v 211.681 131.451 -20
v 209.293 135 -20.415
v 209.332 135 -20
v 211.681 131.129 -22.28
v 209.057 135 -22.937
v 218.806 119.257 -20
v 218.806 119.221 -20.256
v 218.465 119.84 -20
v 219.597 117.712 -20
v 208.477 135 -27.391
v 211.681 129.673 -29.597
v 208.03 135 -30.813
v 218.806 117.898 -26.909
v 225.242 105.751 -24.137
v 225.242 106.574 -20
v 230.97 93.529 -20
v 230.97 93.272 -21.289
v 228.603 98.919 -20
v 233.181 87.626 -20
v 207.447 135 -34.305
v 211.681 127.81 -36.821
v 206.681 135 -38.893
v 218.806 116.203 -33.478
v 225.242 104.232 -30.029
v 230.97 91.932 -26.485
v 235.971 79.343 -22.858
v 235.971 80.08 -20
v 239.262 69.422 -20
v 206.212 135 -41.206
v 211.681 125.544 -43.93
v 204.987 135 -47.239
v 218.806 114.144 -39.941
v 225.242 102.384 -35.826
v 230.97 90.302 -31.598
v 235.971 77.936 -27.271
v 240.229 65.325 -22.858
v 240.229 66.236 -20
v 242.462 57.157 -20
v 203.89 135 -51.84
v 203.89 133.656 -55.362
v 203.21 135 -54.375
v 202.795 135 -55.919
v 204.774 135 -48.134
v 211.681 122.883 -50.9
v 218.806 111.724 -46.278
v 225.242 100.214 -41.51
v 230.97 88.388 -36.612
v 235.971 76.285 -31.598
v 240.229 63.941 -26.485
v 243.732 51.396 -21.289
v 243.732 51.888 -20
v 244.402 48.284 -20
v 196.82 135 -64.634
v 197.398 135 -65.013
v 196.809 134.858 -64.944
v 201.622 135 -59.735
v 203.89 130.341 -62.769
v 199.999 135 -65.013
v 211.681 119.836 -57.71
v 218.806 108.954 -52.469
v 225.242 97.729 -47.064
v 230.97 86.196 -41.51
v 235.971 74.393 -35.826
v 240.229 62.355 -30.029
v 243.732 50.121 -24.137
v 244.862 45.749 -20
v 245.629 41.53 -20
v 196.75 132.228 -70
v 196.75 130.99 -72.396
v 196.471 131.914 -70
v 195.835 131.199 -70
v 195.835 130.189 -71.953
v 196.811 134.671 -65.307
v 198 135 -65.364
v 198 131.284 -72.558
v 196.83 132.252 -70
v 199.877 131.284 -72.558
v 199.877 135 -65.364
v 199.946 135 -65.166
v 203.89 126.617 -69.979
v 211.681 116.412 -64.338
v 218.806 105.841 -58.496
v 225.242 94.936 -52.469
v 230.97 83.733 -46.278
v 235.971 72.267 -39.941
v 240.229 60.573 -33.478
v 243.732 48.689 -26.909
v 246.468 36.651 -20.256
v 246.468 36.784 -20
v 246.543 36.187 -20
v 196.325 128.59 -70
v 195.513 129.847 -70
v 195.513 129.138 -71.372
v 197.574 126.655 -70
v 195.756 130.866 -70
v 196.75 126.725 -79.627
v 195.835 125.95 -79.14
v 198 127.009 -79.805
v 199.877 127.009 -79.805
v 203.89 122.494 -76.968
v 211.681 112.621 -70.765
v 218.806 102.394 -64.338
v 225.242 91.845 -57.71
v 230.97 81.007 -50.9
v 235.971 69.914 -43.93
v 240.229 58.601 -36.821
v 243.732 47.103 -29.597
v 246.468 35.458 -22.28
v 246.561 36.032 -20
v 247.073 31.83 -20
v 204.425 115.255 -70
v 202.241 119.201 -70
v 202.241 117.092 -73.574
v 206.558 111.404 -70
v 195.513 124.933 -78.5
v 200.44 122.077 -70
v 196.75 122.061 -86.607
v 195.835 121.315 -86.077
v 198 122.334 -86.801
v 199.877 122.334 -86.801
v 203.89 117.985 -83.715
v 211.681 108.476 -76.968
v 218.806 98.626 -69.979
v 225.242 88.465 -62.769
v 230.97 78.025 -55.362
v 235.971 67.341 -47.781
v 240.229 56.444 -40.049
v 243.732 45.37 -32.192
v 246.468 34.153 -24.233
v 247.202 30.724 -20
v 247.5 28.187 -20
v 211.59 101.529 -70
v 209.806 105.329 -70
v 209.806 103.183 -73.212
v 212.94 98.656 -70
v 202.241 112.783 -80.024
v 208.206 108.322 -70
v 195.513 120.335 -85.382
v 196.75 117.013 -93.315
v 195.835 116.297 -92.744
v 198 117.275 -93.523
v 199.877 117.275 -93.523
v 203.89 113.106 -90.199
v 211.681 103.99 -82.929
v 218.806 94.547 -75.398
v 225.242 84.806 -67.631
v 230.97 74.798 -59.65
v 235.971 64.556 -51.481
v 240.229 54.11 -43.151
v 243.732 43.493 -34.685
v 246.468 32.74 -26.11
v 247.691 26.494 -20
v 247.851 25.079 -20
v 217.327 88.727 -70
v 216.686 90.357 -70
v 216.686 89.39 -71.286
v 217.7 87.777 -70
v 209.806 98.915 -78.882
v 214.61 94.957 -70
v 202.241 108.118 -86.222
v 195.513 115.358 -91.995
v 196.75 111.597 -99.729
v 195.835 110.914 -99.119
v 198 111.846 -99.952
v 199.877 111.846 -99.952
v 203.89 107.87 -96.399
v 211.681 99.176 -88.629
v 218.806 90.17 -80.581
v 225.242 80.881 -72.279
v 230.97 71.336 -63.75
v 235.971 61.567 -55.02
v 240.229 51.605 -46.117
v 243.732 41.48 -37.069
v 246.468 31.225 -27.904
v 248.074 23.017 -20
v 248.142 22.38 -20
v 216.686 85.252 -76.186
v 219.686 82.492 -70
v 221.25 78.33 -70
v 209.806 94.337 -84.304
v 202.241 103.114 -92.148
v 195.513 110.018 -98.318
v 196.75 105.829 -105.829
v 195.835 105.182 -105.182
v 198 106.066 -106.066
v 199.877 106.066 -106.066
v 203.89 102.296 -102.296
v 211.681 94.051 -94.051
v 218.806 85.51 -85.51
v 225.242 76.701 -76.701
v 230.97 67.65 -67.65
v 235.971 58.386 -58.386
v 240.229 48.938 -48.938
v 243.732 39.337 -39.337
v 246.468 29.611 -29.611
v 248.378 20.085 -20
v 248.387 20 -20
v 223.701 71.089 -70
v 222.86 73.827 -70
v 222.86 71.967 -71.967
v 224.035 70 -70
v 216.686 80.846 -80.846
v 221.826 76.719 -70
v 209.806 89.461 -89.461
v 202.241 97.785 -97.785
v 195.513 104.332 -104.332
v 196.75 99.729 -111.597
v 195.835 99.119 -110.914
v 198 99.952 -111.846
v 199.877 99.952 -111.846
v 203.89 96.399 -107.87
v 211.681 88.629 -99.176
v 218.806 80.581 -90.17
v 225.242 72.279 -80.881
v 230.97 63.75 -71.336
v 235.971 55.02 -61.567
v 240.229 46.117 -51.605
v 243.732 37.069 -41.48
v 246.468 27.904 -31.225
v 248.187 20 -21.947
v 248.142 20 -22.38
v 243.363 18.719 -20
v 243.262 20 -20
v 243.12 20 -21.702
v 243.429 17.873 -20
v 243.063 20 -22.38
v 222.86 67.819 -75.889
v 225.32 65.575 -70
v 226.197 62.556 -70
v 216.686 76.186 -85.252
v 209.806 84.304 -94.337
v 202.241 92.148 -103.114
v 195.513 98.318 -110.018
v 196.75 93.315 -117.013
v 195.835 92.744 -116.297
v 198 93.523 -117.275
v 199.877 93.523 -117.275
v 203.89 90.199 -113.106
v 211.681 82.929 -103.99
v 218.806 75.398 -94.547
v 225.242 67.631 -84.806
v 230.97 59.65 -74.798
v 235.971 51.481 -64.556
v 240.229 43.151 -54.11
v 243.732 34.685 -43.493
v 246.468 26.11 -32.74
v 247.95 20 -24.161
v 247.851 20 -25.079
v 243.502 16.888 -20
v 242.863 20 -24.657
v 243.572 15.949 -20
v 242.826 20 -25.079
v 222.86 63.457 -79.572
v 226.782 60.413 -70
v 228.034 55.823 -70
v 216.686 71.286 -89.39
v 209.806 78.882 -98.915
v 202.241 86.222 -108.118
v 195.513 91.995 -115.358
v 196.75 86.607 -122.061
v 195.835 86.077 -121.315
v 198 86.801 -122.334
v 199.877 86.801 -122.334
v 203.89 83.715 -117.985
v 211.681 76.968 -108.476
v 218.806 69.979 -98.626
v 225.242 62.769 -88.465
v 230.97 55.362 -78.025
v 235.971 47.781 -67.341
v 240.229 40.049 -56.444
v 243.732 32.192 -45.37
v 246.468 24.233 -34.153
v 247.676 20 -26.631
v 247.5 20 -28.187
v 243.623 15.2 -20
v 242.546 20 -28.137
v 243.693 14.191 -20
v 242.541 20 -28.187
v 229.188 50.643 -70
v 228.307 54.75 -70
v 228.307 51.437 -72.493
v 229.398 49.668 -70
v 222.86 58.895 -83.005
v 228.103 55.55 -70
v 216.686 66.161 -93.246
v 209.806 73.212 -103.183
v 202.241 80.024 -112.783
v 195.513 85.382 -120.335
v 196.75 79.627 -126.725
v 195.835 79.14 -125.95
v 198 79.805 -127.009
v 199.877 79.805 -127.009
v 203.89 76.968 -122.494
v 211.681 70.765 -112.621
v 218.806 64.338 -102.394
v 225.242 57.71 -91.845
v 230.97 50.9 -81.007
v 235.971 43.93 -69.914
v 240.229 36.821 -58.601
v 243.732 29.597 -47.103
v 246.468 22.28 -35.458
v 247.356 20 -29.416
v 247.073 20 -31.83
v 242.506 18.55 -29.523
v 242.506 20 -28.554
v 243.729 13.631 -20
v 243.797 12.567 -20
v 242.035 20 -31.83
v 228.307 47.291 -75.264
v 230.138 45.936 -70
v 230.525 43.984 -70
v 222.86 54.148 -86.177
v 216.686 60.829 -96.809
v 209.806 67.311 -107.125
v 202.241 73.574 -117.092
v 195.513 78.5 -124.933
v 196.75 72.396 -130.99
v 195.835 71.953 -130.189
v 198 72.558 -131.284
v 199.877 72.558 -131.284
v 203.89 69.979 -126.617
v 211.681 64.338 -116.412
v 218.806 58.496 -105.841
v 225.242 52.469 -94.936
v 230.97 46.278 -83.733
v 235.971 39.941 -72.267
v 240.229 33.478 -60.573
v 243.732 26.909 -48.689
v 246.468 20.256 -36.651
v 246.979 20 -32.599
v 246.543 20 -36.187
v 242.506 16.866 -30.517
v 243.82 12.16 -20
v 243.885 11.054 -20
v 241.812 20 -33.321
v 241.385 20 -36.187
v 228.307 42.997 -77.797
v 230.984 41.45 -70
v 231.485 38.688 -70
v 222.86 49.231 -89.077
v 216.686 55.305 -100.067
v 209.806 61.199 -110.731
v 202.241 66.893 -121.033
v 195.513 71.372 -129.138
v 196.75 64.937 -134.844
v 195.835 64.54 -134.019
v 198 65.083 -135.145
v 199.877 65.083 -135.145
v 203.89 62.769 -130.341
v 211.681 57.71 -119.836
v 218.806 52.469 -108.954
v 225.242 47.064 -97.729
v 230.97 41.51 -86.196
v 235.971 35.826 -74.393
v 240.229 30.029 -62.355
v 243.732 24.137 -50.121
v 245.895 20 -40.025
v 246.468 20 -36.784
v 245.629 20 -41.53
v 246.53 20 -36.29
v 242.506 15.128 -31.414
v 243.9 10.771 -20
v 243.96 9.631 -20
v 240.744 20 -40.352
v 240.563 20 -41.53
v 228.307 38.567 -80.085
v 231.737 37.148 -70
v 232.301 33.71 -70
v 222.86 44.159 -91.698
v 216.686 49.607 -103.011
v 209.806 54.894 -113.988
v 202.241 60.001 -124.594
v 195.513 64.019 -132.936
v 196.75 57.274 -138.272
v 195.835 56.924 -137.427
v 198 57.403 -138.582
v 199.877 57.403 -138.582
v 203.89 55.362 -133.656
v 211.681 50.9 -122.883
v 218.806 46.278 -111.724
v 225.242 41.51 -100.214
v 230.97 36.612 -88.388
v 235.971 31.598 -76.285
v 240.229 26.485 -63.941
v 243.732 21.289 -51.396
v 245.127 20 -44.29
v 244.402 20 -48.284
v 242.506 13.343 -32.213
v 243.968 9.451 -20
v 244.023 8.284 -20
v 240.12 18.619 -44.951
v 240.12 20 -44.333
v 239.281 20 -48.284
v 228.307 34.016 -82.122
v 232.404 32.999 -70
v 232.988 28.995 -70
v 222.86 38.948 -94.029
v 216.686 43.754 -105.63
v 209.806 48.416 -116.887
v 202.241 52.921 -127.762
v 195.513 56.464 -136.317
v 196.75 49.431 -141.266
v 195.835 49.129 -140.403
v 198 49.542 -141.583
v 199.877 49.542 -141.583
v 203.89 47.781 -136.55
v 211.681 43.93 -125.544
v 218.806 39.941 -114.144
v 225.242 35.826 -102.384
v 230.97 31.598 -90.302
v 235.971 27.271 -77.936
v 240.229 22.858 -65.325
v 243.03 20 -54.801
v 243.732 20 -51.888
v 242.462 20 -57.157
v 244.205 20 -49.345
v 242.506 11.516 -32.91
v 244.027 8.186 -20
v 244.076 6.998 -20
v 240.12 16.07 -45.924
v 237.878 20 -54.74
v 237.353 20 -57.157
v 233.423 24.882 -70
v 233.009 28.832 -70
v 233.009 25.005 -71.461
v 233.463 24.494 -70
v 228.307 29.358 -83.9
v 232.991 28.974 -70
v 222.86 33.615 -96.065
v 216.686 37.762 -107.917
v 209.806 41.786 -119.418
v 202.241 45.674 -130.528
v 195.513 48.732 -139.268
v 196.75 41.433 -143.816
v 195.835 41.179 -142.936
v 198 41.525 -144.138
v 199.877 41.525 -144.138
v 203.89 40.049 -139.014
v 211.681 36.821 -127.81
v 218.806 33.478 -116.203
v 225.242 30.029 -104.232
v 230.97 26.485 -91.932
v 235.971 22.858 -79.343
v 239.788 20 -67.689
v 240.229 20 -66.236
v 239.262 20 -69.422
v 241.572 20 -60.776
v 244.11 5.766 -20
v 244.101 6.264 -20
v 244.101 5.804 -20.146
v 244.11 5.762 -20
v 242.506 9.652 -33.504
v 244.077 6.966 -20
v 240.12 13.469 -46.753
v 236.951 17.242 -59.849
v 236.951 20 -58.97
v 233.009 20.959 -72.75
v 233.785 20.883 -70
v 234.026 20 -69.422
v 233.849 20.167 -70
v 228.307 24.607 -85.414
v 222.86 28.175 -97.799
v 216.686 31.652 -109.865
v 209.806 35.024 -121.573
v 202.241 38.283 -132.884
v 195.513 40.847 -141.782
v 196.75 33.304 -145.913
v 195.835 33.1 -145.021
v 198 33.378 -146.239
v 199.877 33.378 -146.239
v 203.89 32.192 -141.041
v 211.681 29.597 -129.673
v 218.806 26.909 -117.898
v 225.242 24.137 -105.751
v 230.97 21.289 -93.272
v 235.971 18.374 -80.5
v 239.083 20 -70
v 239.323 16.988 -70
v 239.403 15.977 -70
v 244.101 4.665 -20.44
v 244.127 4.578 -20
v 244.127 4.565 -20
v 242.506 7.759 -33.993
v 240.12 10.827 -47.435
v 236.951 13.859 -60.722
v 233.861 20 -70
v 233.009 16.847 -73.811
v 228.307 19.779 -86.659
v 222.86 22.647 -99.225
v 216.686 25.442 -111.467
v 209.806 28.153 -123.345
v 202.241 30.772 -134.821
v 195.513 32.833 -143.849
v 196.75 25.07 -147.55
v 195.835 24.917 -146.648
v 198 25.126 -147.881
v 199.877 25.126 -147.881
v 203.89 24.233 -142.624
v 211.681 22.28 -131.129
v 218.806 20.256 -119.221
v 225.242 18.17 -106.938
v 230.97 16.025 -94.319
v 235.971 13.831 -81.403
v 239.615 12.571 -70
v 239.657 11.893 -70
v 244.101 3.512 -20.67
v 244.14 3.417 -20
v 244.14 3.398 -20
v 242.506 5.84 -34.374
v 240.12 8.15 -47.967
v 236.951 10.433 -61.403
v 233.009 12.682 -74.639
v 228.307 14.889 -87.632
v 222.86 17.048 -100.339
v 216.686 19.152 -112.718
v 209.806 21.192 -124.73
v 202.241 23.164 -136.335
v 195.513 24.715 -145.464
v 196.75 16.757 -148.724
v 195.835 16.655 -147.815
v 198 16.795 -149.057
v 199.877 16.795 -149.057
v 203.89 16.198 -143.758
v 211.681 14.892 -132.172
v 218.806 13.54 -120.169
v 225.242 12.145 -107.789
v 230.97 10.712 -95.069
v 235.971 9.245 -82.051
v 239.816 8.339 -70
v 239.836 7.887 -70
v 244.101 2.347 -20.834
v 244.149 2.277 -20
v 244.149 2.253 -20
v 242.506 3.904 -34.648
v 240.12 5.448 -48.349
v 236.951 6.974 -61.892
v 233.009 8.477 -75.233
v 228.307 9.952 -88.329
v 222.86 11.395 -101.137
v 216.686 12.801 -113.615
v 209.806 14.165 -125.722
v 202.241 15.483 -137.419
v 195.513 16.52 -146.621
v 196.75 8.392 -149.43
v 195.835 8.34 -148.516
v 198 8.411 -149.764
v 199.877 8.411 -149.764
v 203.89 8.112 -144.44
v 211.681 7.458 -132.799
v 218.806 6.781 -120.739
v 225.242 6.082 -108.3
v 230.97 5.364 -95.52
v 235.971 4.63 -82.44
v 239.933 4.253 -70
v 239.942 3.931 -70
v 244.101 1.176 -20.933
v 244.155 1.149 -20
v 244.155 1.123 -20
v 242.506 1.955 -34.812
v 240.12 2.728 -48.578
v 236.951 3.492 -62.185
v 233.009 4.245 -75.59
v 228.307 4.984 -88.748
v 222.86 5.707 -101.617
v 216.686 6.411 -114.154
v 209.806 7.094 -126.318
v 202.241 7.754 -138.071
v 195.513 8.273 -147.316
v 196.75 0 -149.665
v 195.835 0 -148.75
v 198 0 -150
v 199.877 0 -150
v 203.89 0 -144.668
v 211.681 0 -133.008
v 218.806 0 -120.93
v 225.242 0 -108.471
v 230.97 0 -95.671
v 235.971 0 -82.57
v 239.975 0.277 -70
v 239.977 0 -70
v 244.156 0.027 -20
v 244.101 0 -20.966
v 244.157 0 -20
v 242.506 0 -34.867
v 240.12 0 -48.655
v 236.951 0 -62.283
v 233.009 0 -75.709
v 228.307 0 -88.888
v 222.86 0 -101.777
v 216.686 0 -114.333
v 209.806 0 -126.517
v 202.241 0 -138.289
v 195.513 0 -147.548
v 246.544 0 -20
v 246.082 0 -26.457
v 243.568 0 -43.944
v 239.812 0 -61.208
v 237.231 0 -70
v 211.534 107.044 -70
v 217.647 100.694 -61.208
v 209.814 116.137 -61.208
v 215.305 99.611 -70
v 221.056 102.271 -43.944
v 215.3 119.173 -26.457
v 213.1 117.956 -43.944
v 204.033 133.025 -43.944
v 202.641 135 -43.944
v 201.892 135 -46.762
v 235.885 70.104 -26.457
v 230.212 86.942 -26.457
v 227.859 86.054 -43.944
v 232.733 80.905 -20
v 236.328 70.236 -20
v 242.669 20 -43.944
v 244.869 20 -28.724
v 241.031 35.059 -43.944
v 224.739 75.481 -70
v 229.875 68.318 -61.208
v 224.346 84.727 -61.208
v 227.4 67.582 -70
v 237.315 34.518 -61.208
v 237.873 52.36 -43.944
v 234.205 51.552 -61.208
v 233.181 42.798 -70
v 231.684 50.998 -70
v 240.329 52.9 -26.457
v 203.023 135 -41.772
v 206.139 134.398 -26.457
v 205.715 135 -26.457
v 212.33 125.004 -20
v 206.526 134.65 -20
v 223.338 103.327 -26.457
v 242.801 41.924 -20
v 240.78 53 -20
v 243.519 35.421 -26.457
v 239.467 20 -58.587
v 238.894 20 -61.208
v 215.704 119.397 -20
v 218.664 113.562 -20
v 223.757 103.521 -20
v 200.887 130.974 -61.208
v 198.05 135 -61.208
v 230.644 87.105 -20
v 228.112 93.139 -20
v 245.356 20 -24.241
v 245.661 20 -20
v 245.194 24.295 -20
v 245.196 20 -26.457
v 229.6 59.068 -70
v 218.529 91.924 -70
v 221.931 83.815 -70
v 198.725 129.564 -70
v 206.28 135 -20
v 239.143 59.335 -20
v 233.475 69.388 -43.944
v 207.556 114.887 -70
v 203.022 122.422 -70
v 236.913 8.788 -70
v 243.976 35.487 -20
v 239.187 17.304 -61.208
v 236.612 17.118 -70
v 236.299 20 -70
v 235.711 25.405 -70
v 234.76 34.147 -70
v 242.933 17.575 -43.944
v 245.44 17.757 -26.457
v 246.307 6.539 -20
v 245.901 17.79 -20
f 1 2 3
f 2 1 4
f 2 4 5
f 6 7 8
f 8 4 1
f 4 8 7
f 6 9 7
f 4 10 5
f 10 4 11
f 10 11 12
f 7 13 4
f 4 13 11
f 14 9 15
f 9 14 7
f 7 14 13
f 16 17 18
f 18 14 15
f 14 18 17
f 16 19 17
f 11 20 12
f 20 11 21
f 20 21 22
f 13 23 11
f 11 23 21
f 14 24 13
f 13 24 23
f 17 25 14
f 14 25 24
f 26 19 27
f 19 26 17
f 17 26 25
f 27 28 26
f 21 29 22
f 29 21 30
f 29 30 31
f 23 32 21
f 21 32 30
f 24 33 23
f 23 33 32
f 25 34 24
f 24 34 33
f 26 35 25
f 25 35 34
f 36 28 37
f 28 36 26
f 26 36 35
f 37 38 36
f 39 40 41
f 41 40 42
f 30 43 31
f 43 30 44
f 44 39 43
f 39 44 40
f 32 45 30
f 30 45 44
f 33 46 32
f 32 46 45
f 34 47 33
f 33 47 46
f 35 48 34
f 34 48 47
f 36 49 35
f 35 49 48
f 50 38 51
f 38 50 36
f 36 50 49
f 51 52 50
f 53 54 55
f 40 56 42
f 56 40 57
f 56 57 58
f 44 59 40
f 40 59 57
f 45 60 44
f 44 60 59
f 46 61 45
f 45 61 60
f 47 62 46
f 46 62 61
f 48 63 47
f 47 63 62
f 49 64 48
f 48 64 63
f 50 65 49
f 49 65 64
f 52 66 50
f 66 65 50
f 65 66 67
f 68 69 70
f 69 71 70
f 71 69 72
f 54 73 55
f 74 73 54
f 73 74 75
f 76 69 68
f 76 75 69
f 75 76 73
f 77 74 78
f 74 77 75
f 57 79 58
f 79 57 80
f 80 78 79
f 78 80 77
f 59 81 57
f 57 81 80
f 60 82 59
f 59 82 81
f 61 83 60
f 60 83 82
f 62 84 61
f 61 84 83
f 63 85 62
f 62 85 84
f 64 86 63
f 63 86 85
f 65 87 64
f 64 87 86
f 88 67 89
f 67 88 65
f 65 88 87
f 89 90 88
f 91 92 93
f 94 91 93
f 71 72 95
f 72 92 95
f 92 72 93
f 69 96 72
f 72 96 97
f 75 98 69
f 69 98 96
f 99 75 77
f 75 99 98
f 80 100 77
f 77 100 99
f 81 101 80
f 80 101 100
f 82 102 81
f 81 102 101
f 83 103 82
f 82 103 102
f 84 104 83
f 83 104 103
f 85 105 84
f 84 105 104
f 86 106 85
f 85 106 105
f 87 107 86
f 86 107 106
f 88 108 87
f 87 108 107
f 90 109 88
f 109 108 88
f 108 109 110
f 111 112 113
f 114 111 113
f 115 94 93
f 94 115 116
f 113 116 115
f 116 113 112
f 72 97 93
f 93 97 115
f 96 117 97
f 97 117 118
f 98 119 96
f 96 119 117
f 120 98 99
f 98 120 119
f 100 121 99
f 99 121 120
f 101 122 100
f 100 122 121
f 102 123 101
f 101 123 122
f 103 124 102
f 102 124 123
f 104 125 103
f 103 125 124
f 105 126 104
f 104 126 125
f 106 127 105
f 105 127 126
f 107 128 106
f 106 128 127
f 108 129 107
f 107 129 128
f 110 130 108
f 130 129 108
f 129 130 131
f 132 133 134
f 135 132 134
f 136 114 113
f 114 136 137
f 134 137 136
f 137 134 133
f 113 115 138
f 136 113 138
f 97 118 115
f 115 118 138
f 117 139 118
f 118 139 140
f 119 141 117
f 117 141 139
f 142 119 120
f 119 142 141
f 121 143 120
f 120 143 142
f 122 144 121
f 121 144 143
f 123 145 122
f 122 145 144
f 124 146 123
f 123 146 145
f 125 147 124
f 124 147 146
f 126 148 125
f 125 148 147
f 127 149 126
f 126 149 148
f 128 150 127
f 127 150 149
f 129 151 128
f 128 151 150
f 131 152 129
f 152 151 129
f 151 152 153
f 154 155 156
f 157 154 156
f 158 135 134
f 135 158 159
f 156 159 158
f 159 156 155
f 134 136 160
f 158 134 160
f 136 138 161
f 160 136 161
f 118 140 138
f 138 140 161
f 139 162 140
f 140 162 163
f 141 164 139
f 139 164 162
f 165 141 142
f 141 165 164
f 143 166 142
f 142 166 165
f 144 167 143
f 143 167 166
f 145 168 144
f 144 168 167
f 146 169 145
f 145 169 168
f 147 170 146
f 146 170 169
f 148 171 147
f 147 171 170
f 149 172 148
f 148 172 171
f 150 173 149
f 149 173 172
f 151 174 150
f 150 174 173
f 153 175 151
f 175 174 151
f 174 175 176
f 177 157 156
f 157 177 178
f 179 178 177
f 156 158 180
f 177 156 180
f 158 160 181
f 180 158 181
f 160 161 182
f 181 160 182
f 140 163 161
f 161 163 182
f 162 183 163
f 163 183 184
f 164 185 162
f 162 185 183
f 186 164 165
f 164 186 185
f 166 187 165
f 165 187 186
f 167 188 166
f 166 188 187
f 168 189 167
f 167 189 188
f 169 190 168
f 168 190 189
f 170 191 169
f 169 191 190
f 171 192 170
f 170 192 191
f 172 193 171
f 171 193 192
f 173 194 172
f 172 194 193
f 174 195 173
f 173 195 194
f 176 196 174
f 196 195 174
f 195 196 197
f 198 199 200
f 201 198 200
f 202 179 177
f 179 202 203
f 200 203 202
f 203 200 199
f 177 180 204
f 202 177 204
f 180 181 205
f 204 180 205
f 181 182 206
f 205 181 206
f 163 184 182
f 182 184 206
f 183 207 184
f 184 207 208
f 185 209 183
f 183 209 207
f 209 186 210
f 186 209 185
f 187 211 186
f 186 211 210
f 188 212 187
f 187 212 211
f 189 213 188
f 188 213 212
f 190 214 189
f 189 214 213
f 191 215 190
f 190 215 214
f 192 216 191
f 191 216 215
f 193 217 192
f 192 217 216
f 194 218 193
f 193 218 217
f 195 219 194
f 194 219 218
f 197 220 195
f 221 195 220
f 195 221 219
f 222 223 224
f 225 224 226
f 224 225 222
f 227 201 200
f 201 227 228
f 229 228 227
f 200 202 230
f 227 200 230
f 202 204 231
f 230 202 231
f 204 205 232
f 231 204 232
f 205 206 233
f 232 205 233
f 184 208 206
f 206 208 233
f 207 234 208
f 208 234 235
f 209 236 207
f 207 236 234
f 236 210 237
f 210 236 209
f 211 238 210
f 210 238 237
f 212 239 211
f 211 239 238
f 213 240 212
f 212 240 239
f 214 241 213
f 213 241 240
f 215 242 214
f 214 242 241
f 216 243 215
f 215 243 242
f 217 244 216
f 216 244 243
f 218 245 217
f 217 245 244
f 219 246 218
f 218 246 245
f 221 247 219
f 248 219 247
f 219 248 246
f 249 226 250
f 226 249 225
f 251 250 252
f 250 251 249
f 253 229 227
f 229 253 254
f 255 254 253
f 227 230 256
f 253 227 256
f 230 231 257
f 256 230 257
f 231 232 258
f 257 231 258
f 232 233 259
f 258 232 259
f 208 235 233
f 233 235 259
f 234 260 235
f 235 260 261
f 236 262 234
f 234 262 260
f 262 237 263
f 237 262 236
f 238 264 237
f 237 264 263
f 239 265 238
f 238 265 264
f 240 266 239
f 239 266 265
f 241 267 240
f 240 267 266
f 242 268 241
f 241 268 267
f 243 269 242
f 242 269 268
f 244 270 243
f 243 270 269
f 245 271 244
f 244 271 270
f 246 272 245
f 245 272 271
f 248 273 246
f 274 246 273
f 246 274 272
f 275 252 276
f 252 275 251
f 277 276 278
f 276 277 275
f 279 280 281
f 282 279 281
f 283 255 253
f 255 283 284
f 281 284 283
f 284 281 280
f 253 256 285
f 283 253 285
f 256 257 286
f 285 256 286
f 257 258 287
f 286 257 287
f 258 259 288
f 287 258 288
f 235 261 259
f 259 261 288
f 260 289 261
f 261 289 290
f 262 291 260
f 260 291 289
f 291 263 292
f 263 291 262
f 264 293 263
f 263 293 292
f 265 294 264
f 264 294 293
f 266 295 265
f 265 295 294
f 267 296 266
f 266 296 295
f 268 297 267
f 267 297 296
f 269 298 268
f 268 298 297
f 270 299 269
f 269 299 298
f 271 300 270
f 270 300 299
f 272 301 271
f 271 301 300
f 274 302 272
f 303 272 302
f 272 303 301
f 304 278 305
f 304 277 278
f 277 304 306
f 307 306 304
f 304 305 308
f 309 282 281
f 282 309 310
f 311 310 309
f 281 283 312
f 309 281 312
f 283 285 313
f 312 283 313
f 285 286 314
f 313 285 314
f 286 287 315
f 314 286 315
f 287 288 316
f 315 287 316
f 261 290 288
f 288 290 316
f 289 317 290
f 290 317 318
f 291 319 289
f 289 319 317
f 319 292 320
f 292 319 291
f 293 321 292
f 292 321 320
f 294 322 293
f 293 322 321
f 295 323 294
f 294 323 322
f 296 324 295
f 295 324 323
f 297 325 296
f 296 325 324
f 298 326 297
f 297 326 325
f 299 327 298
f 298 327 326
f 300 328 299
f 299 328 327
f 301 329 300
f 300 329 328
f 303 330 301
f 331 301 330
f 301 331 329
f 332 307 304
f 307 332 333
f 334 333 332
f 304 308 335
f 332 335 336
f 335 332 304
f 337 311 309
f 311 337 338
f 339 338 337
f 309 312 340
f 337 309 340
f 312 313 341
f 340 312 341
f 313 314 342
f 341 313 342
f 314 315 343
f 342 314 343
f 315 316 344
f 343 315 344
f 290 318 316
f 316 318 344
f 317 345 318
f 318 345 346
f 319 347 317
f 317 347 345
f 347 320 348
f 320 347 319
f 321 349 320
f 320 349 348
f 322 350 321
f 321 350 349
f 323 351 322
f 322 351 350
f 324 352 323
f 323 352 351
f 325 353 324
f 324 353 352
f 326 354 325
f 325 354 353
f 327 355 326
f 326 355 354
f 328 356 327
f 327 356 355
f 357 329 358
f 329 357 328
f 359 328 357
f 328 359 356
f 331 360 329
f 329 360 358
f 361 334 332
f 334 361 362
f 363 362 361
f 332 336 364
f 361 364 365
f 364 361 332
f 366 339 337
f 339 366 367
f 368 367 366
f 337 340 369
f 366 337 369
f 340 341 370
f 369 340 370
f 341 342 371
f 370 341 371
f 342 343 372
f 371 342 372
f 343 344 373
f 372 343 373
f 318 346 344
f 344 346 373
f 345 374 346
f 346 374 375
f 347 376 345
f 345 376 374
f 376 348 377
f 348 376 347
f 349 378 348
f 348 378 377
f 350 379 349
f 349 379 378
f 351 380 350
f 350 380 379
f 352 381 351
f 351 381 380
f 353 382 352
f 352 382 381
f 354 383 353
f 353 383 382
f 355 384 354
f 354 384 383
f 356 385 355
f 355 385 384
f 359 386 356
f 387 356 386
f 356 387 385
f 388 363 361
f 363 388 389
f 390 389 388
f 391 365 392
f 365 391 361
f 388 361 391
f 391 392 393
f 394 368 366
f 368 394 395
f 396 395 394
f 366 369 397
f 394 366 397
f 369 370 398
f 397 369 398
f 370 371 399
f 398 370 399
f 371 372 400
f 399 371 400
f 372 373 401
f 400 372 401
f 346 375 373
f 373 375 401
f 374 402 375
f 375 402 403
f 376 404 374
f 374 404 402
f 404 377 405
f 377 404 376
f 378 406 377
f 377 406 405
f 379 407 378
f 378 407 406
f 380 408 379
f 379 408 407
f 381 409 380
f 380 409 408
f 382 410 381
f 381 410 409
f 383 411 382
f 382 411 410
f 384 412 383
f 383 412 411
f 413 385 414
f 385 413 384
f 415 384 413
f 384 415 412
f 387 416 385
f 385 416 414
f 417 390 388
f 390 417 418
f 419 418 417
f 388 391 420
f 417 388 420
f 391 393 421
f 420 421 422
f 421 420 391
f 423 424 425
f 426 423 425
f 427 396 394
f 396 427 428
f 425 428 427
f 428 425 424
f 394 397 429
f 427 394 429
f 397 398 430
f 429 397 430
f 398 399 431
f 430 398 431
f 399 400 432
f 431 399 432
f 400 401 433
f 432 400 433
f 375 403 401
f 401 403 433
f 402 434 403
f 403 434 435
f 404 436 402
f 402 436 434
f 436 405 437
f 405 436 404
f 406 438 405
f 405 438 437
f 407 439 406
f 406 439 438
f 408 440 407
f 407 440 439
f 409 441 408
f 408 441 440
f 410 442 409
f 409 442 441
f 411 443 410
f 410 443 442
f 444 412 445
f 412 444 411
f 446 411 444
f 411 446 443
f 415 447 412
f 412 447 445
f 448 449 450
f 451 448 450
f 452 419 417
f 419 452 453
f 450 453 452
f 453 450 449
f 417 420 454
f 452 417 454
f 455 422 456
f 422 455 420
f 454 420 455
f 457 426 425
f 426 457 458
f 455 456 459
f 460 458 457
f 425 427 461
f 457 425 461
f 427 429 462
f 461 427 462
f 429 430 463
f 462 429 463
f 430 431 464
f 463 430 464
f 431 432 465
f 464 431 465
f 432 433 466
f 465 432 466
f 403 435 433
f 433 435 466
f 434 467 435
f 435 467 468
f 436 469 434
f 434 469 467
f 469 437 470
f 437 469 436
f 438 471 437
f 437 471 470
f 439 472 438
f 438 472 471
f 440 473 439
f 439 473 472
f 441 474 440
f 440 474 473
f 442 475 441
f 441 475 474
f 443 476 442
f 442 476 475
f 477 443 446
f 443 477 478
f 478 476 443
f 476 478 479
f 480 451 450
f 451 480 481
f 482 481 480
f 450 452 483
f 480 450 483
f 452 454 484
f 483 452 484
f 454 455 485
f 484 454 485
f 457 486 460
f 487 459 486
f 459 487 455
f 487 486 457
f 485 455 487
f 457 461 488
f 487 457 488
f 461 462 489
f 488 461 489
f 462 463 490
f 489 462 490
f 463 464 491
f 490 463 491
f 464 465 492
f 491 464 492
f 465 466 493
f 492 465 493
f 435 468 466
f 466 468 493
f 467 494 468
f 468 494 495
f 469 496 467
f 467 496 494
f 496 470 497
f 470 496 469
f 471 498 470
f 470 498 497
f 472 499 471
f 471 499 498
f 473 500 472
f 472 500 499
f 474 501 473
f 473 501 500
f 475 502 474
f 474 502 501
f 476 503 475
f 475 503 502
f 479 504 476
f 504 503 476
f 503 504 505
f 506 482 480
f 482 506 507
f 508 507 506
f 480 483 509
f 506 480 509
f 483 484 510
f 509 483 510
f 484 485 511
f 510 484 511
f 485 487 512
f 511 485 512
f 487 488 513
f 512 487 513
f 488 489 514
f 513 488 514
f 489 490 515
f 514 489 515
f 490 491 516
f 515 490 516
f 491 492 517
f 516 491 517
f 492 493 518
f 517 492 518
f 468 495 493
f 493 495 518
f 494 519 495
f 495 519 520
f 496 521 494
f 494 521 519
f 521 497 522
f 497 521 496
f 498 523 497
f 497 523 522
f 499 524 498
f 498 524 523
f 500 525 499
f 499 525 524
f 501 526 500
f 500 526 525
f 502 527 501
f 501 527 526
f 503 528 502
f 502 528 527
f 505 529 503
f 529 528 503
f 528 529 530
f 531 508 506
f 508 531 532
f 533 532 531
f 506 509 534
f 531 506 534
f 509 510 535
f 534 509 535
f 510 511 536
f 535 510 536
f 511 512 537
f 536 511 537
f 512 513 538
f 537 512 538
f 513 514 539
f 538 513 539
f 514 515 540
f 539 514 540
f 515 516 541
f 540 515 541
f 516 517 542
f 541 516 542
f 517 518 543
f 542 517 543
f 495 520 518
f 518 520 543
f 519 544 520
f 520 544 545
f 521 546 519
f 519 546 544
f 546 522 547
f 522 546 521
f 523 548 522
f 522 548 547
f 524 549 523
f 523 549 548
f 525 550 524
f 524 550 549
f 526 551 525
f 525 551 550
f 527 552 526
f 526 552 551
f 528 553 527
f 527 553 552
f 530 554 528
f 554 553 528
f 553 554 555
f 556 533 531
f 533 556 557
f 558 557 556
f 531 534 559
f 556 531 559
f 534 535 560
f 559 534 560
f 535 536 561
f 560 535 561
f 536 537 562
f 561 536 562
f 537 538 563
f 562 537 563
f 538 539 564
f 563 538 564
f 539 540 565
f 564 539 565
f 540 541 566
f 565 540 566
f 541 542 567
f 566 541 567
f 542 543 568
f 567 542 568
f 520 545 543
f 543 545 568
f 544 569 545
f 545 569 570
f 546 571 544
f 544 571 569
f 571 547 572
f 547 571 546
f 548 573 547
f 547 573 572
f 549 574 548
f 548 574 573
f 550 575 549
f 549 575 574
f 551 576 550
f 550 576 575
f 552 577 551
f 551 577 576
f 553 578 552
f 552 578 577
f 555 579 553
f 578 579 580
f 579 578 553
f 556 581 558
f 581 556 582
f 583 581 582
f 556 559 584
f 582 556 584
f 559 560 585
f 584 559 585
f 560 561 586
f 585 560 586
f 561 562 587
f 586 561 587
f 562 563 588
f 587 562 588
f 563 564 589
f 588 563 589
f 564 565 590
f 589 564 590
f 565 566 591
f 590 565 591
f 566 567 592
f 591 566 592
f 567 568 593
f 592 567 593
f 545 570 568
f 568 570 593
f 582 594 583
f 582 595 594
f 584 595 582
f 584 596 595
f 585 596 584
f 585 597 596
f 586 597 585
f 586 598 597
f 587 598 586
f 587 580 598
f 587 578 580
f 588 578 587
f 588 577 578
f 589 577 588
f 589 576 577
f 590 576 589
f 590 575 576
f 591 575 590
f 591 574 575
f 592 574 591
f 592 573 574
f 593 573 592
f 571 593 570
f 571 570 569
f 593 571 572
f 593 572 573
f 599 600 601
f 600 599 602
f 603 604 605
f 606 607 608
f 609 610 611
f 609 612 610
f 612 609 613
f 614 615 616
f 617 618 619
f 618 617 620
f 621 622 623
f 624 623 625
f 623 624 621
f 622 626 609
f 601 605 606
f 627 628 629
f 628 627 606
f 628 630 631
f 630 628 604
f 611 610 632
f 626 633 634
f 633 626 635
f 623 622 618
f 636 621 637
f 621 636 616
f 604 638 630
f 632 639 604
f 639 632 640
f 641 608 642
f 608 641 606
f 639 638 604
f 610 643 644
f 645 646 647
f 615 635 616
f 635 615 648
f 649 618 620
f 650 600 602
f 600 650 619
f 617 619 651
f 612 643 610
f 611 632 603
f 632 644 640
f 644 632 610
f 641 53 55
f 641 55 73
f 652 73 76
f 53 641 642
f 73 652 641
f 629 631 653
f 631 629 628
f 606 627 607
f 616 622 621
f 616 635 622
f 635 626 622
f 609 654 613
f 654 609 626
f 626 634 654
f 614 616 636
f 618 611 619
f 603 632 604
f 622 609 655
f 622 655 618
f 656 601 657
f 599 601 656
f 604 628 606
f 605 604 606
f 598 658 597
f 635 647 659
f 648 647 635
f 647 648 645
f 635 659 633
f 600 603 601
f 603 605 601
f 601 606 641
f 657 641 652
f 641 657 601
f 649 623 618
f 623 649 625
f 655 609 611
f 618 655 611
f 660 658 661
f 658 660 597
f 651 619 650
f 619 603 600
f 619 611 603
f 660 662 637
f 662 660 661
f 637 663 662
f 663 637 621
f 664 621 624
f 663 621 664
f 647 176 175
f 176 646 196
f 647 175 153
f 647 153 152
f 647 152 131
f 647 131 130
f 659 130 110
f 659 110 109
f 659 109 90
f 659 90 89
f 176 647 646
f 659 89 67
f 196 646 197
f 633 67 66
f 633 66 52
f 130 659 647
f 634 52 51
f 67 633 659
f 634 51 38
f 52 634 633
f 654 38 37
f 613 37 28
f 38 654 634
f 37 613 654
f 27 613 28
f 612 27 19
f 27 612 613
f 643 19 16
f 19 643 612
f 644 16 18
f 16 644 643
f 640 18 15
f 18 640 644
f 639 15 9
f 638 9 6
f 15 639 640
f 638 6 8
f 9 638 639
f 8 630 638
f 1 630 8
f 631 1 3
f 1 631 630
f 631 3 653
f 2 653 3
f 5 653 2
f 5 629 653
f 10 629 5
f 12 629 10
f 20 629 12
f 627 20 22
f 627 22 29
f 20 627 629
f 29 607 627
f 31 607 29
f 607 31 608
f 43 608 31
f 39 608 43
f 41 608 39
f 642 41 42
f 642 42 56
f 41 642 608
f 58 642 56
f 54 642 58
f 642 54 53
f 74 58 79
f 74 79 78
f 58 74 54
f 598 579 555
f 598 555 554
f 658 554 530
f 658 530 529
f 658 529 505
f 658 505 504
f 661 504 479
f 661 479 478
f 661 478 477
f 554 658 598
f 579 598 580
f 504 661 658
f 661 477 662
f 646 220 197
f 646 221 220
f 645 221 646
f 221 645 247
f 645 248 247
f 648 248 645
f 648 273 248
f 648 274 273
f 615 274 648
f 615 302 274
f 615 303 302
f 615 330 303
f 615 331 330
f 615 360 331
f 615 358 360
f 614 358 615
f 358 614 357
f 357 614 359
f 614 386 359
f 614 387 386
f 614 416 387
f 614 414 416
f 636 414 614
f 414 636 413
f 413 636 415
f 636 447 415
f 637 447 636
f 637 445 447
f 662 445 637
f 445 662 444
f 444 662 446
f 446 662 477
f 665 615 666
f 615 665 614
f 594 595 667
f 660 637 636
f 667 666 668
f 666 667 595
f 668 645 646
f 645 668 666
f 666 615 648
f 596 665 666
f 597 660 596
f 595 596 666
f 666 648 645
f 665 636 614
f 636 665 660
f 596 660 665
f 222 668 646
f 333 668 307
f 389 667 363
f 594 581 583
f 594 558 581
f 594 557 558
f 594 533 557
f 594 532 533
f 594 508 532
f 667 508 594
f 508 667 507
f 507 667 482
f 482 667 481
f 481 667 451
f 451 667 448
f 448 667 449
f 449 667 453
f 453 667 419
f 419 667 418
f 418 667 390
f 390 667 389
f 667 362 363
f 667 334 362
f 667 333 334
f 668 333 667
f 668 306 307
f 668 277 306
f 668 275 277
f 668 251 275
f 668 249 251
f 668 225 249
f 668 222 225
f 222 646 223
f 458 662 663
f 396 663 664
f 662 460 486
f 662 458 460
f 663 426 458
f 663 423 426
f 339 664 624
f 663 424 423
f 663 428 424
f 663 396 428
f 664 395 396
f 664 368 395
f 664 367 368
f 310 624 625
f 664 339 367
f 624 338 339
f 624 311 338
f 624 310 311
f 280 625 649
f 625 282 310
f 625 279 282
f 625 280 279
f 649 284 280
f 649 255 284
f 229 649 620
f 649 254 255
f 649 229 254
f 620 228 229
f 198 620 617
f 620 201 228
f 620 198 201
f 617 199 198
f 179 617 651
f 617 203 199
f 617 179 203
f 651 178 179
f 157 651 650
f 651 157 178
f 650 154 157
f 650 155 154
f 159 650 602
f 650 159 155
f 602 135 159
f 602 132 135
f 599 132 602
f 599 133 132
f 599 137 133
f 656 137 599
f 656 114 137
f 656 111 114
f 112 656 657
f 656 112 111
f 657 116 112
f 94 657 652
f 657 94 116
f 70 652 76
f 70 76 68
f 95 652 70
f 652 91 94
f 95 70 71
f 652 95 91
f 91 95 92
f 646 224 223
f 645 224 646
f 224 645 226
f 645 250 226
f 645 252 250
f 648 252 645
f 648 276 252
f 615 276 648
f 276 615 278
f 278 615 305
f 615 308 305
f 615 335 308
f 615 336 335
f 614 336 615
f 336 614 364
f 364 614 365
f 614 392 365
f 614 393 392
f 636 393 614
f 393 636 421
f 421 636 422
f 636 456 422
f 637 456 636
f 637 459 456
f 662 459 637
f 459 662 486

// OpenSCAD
// file: ../motors/MN5212.scad
use <../utils.scad>

module MN5212(){

	render(){
		translate([0,0, 42.5 / 2 - 23 / 2 - 4.9 - 6])
			cylinder(
				h = 23,
				r = 59 / 2,
				$fa = fa(59 / 2),
				center = true);
		translate([0,0, 42.5 / 2 - 4.9 / 2 - 6])
			cylinder(
				h = 4.9,
				r1 = 59 / 2,
				r2 = 24.8 / 2,
				$fa = fa(59 / 2),
				center = true);
		translate([0,0, - 42.5 / 2 + 5.6 / 2 + 3])
			cylinder(
				h = 5.6,
				r1 = 44 / 2,
				r2 = 59 / 2,
				$fa = fa(59 / 2),
				center = true);
		translate([0, 0, 42.5 / 2 - 3])
			cylinder(
				h = 6,
				r = 4 / 2,
				$fa = fa(4 / 2),
				center = true);
		translate([0, 0, - 42.5 / 2 + 1.5])
			cylinder(
				h = 3,
				r = 6 / 2,
				$fa = fa(6 / 2),
				center = true);
	}

}
// file: ../servos/HS_5065MG.scad
use <../utils.scad>

module HS_5065MG(){

	length = 23.75;
	width = 11.68;
	depth = 20.32;
	wing_width = 32.38;
	wing_thick = 3.43;
	shaft_offset = 6;
	hole_spacing = 28.32;
	shaft_height = 26.16;
	shaft_length = 2;

	module mounting_hole(){
		mh_rad = 2 / 2;
		translate(
			[
				hole_spacing / 2,
				0,
				depth / 2 - wing_thick / 2
			])
			cylinder(h = 5, r = mh_rad, $fa = fa(mh_rad), center = true);
	}

	difference(){
		union(){
			cube([length, width, depth], center = true);
			translate([0, 0, depth / 2 - wing_thick / 2])
				cube([wing_width, width, wing_thick], center = true);
			translate(
				[
					- length / 2 + shaft_offset,
					0,
					shaft_height - length / 2 + shaft_length / 2
				])
				cylinder(
					h = shaft_length,
					r = 1.5,
					$fa = fa(1.5),
					center = true);
		}	union(){

			mounting_hole();
			mirror() mounting_hole();
		}
	}
}

HS_5065MG();
// file: ../servos/LS_0006_servo.scad
// Author Michael Marques (DrYerzinia)

use <../utils.scad>

module ls_0006_servo(){
	
	length = 21.4;
	depth = 19.9;
	thickness = 11.65;

	gear_height = 2.6;
	gear_bump_height = 0.7;
	gear_bump_diameter = 1.97;
	gear_outer_bump_diameter = 6;
	gear_bump_offset = 12.2;

	shaft_height = 2.4;
	shaft_diameter = 3.74;
	shaft_offset = thickness / 2;
	shaft_screw_diameter = 1.3;
	
	wing_outer_width = 8.5;
	wing_top_off = 3.8;
	wing_length = 3.8;
	wing_thickness = 1.2;
	wing_hole_diameter = 1.85;
	wing_hole_edge_dist = 2;

	module wing_hole(){
		translate(
			[
				length / 2 + wing_hole_edge_dist,
				0,
				depth/2 - wing_top_off - wing_thickness / 2
			])
			cylinder(
				h = wing_thickness + 1,
				r = wing_hole_diameter / 2,
				$fn = 16,
				center = true);
	}

	module wing(){
		translate(
			[
				length / 2,
				thickness / 2,
				depth/2 - wing_top_off - wing_thickness
			])
			rotate([0,0,-90])
				trapezoid(
					thickness,
					wing_outer_width,
					wing_length,
					wing_thickness);
	}

	// Body
	cube([length, thickness, depth], center = true);

	difference(){
		union(){

			wing();
			mirror() wing();

			// Gear Bumps
			translate([0, 0, depth/2 + gear_height / 2]){
				translate([length / 2 - gear_bump_offset, 0, 0])
					cylinder(
						h = gear_height,
						r = gear_outer_bump_diameter / 2,
						$fn = 16,
						center = true);
				translate([length / 2 - gear_bump_offset, 0, gear_height/2 + gear_bump_height / 2])
					cylinder(
						h = gear_bump_height,
						r = gear_bump_diameter / 2,
						$fn = 16,
						center = true);
				translate([length / 2 - shaft_offset, 0, 0])
					cylinder(
						h = gear_height,
						r = thickness / 2,
						$fn = 32,
						center = true);
				// Shaft
				translate([length / 2 - shaft_offset, 0, gear_height])
					cylinder(
						h = shaft_height,
						r = shaft_diameter / 2,
						$fn = 16,
						center = true);
			}

		}
		union(){

			wing_hole();
			mirror() wing_hole();

			// Shaft_hole
			translate(
				[
					length / 2 - shaft_offset,
					0,
					depth/2 + gear_height * (3 / 2) + 0.5])
				cylinder(
					h = shaft_height + 1,
					r = shaft_screw_diameter / 2,
					$fn = 16,
					center = true);

		}
	}

}

module translate_ls_0006_attachment(){

	length = 21.4;
	thickness = 11.65;
	shaft_offset = thickness / 2;
	depth = 19.9;
	float = 3.3;

	translate([length / 2 - shaft_offset, 0, depth / 2 + float])
		children();

}

module bar_attachment(){

	height = 3.75;
	bar_length = 14.7;
	bar_thickness = 1.6;
	inner_radius = 5.9;
	outer_radius = 3.95;
	shaft_diameter = 3.7;
	upper_void_diameter = 4.8;
	screw_diameter = 2;
	hole_spacing = 2;
	hole_4_diameter = 1.2;
	hole_diameter = 1;
	hole_start_off = 4.7;
	top_void_depth = 0.67;
	bottom_void_depth = 1.84;

	translate([0, 0, height / 2]){
		difference(){
			union(){

				translate([0, inner_radius / 2, height / 2 - bar_thickness])
					rotate([0,0,-90])
						trapezoid(
							inner_radius,
							outer_radius,
							bar_length,
							bar_thickness);

				cylinder(
					h = height,
					r = inner_radius / 2,
					$fn = 16,
					center = true);

				translate([bar_length, 0, height / 2 - bar_thickness / 2])
					cylinder(
						h = bar_thickness,
						r = outer_radius / 2,
						$fn = 16,
						center = true);

			}
			union(){
				// screwhole
				cylinder(
					h = height + 1,
					r = screw_diameter / 2,
					$fn = 16,
					center = true);
				// voids
				translate([0, 0, height / 2 - top_void_depth / 2 + 0.5])
					cylinder(
						h = top_void_depth + 1,
						r = upper_void_diameter / 2,
						$fn = 16,
						center = true);
				translate([0, 0,  - bottom_void_depth / 2 - 0.5])
					cylinder(
						h = bottom_void_depth + 1,
						r = shaft_diameter / 2,
						$fn = 16,
						center = true);

				for(i = [0:4]){
					dia = (i != 3) ? hole_diameter : hole_4_diameter;
					translate(
						[
							hole_start_off + hole_spacing * i,
							0,
							height / 2 - bar_thickness / 2])
						cylinder(
							h = bar_thickness + 1,
							r = dia / 2,
							$fn = 16,
							center = true);
				}

			}
		}
	}

}

ls_0006_servo();
translate_ls_0006_attachment() bar_attachment();
// file: ../servos/parallax_continuous_rotation_servo.scad
// Author Michael Marques (DrYerzinia)

module parallax_continuous_rotation_servo(){

	depth = 37.7;
	length = 40.75;
	width = 19.75;

	mount_height = 2.7;
	mount_extent = 6.1;
	mount_from_top = 7.7;

	mount_hole_diameter = 4.46;
	mount_hole_spacing = 14.4 - mount_hole_diameter;

	shaft_diameter = 5.8;
	shaft_offset = 10;
	shaft_length = 3.5;

	module mounting_hole(){

			translate(
				[
					length / 2 + 5,
					mount_hole_spacing / 2,
					depth / 2 - mount_height / 2 - mount_from_top
				]
				)
				cylinder(
					h = mount_height + 1,
					r = mount_hole_diameter / 2,
					$fn=16,
					center = true);
	}

	difference(){
		union(){

			// Body
			cube([length,width,depth], center = true);

			// Mounting wings
			translate(
				[
					0,
					0,
					depth / 2 - mount_height / 2 - mount_from_top
				])
				cube(
					[
						length + mount_extent * 2,
						width,
						mount_height
					],
					center = true);

			// Shaft
			translate(
				[
					length / 2 - shaft_offset,
					0,
					depth / 2 + shaft_length / 2
				]
				)
				cylinder(
					h = shaft_length,
					r = shaft_diameter / 2,
					$fn = 16,
					center = true
				);

		}
		union(){

			// Mounting Holes
			mounting_hole();
			mirror()
				mounting_hole();

			translate([0,-mount_hole_spacing,0]){
				mounting_hole();
				mirror()
					mounting_hole();
			}
		}
	}

}

module translate_shaft(){

	depth = 37.7;
	length = 40.75;

	shaft_offset = 10;

	translate(
		[
			length / 2 - shaft_offset,
			0,
			depth / 2
		])
		children();
}

module round_servo_attachment(){

	height = 6;
	diameter = 20.8;
	inner_diameter = 8.6;
	plate_thickness = 2.45;

	float = 2;

	depth = 37.7;
	length = 40.75;

	shaft_offset = 10;

	plate_hole_spacing = 14.5;
	plate_hole_diameter = 1.4;
	plate_hole_minor_spacing = 3.5;

	screw_hole_diameter = 3;

	inner_diameter = 8;
	
	top_depth = 1.8;
	bottom_depth = 3.4;

	void_diameter = 5.8;

	module plate_hole(){
		cylinder(
			h = plate_thickness + 1,
			r = plate_hole_diameter / 2,
			$fn = 16,
			center = true
		);
	}

	module plate_hole_group(){
		translate([0, 0, height / 2 - plate_thickness / 2]){
			translate([0, plate_hole_spacing / 2, 0]){
					plate_hole();
					translate([- plate_hole_minor_spacing, 0, 0])
						plate_hole();
					translate([  plate_hole_minor_spacing, 0, 0])
						plate_hole();
			}
		}
	}

	translate(
		[
			length / 2 - shaft_offset,
			0,
			depth / 2 + height / 2 + float
		]
		)
		difference(){

			union(){

				// inner shaft
				cylinder(
					h = height,
					r = inner_diameter / 2,
					$fn = 16,
					center = true
				);

				// top
				translate([0, 0, height / 2 - plate_thickness / 2])
					cylinder(
						h = plate_thickness,
						r = diameter / 2,
						$fn = 32,
						center = true
					);
			}

			union(){

				// plate holes
				for(ang = [0:3]){
					rotate([0,0, ang * 90])
						plate_hole_group();
				}

				// screw hole
				cylinder(
					h = height + 1,
					r = screw_hole_diameter / 2,
					$fn = 16,
					center = true
				);

				// inner voids
				translate([0, 0, height / 2 - top_depth / 2 + 1])
					cylinder(
						h = top_depth + 1,
						r = void_diameter / 2,
						$fn = 16,
						center = true
					);
				translate([0, 0, -1])
					cylinder(
						h = bottom_depth + 1,
						r = void_diameter / 2,
						$fn = 16,
						center = true
					);

			}

		}

}

parallax_continuous_rotation_servo();
round_servo_attachment();
// file: ../hardware.scad
 // Author Michael Marques (DrYerzinia)

// http://www.ebay.com/itm/10-PCS-683-3x7x2-mm-Metal-OPEN-PRECISION-Miniature-Ball-Bearing-3-7-2-/291206307942?hash=item43cd3fa066:m:mCi6eovrGVk_CjIUjlhw8yg
// E-Bay empire.rc

module washer_M3_7x3_2x0_5mm(){

	difference(){
		cylinder(
			h = 0.5,
			r = 7 / 2,
			$fn = 16,
			center = true);
		cylinder(
			h = 0.5 + 0.1,
			r = 3.2 / 2,
			$fn = 16,
			center = true);
	}

}

module bearing_3x7x2mm(){

	difference(){
		cylinder(
			h = 2,
			r = 7 / 2,
			$fn = 16,
			center = true);
		cylinder(
			h = 2 + 1,
			r = 3 / 2,
			$fn = 16,
			center = true);
	}

}

module bearing_5x8x2_5mm(){

	difference(){
		cylinder(
			h = 2.5,
			r = 8 / 2,
			$fn = 16,
			center = true);
		cylinder(
			h = 2.5 + 1,
			r = 5 / 2,
			$fn = 16,
			center = true);
	}

}

module bearing_8x16x5mm(){

	difference(){
		cylinder(
			h = 5,
			r = 16 / 2,
			$fn = 16,
			center = true);
		cylinder(
			h = 5 + 1,
			r = 8 / 2,
			$fn = 16,
			center = true);
	}

}


bearing_5x8x2_5mm();
// file: ../utils.scad
// http://forum.openscad.org/Creating-pie-pizza-slice-shape-need-a-dynamic-length-array-td3148.html

module pie_slice(r, start_angle, end_angle) {
    R = r * sqrt(2) + 1;
    a0 = (4 * start_angle + 0 * end_angle) / 4;
    a1 = (3 * start_angle + 1 * end_angle) / 4;
    a2 = (2 * start_angle + 2 * end_angle) / 4;
    a3 = (1 * start_angle + 3 * end_angle) / 4;
    a4 = (0 * start_angle + 4 * end_angle) / 4;
    if(end_angle > start_angle)
        intersection() {
        circle(r, $fa = fa(r));
        polygon([
            [0,0],
            [R * cos(a0), R * sin(a0)],
            [R * cos(a1), R * sin(a1)],
            [R * cos(a2), R * sin(a2)],
            [R * cos(a3), R * sin(a3)],
            [R * cos(a4), R * sin(a4)],
            [0,0]
       ]);
    }
}

// https://github.com/openscad/openscad/issues/29

module rotate_about(v,a) {
	translate(v) rotate(a) translate(-v) children(0);
}

module rotate_about_axis(v, ang, axis) {
	translate(v) rotate(ang, axis) translate(-v) children(0);
}

// https://github.com/robofun/openscad-utils/blob/master/trapezoid.scad

module trapezoid(width_base, width_top,height,thickness) {
	

  linear_extrude(height = thickness) polygon(points=[[0,0],[width_base,0],[width_base-(width_base-width_top)/2,height],[(width_base-width_top)/2,height]], paths=[[0,1,2,3]]); 
  
}

// http://forum.openscad.org/fe-Tolerance-based-arc-approximation-td14212.html

function fa(r)=($fn>0)?360/$fn:($fe>0)?($fe<r)?min(45,2*acos(1-$fe/r)):45:$fa; 
// file: ../render_settings.scad
// Author Michael Marques (DrYerzinia)

// Lulzbot Mini tolerances
// x/y 0.1mm
// z   0.05mm
//
// 0.1mm   preview tolerance
// 0.025mm export  tolerance

$fs = 0.01;
$fn = undef;
$fa = 360 / 5;

$fe = 0.025;	// export
// main file
// Author Michael Marques (DrYerzinia)

include <../render_settings.scad>

use <../BB8.scad>

Door_P3();
